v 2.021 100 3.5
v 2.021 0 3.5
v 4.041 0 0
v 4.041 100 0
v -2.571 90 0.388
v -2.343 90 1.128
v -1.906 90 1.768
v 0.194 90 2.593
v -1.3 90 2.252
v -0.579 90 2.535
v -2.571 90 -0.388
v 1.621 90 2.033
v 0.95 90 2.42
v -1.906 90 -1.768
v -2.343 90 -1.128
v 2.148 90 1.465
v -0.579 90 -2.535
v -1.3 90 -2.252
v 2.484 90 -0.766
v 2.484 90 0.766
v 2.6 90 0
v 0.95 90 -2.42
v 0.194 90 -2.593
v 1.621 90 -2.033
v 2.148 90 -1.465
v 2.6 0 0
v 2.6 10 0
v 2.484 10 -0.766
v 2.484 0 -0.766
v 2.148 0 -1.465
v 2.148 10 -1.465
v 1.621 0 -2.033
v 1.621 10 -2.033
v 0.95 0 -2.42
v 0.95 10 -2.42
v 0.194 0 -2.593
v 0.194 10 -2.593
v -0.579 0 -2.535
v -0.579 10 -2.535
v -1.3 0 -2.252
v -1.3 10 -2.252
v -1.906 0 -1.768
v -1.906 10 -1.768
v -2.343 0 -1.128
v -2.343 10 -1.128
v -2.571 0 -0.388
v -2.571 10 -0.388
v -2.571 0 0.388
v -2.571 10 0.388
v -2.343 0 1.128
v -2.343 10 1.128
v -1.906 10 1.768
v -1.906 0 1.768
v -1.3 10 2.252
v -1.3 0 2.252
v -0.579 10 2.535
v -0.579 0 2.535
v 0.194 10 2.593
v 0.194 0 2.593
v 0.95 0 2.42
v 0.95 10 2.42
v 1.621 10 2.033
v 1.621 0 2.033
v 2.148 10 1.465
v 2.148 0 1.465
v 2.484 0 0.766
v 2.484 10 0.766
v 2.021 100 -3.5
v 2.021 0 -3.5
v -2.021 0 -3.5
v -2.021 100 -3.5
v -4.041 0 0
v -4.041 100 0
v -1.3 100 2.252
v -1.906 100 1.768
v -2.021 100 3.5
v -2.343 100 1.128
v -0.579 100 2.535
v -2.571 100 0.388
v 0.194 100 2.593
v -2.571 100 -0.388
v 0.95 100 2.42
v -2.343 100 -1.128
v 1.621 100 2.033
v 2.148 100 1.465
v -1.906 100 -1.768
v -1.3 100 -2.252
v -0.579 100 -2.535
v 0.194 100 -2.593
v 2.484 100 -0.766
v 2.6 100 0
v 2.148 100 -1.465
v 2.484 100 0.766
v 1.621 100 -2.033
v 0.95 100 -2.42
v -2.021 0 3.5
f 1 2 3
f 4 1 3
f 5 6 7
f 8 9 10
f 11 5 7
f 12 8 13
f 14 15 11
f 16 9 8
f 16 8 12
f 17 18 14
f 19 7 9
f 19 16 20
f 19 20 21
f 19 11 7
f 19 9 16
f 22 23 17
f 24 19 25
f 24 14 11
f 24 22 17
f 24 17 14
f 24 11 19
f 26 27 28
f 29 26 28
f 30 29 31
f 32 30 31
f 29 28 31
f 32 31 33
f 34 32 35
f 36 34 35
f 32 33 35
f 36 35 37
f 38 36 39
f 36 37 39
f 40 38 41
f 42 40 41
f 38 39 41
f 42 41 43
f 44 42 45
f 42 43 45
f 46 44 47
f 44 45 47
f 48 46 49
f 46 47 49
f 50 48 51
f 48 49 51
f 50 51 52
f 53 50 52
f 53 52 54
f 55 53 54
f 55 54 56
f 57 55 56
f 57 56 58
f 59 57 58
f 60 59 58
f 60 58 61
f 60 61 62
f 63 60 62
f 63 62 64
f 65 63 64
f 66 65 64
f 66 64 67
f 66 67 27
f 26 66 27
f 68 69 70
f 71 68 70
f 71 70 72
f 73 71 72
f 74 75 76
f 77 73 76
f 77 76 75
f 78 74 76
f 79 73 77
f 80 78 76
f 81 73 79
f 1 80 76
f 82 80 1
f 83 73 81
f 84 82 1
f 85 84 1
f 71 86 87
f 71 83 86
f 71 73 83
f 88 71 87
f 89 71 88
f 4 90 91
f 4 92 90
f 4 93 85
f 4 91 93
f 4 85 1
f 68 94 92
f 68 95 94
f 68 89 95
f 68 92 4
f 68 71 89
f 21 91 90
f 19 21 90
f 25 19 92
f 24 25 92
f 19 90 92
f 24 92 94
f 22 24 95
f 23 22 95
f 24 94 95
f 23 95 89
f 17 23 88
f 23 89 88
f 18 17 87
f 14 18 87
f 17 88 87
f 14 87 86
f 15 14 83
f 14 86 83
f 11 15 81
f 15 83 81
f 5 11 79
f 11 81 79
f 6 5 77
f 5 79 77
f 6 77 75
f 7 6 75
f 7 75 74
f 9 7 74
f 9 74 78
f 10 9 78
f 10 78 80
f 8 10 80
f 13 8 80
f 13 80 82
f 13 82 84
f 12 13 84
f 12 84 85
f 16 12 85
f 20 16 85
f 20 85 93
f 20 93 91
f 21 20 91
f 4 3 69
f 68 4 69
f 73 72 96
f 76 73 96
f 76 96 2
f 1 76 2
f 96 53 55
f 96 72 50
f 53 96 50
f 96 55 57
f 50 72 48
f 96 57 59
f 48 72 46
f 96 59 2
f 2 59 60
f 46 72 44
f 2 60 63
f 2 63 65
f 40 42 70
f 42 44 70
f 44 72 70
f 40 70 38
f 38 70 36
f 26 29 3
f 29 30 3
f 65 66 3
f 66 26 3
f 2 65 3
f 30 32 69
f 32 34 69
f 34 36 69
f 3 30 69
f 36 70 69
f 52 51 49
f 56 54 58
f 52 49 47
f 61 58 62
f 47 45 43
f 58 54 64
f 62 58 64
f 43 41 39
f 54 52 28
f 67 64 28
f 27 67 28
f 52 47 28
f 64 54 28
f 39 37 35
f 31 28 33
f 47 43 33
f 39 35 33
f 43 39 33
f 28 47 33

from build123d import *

# Parameters (mm, degrees)
EXTRUDE_1_DEPTH     = 100
SKETCH_2_R          = 2.6
CUT_EXTRUDE_1_DEPTH = 101
SKETCH_3_R          = 2.6
EXTRUDE_2_DEPTH     = 80


with BuildPart() as part:
    # 草图1 → 凸台-拉伸1 (new body)
    with BuildSketch(Plane(origin=(0, 0, 0), x_dir=(1, 0, 0), z_dir=(0, 1, 0))):
        Polygon((4.041451884, 0), (2.020725942, 3.5), (-2.020725942, 3.5), (-4.041451884, 0), (-2.020725942, -3.5), (2.020725942, -3.5), align=None)
    extrude(amount=EXTRUDE_1_DEPTH)

    # 草图2 → 切除-拉伸1 (cut, through all)
    with BuildSketch(Plane(origin=(0, 100, 0), x_dir=(1, 0, 0), z_dir=(0, 1, 0))):
        Circle(SKETCH_2_R)
    extrude(amount=-CUT_EXTRUDE_1_DEPTH, mode=Mode.SUBTRACT)

    # 草图3 → 凸台-拉伸2 (add)
    with BuildSketch(Plane(origin=(0, 90, 0), x_dir=(1, 0, 0), z_dir=(0, 1, 0))):
        Circle(SKETCH_3_R)
    extrude(amount=-EXTRUDE_2_DEPTH)


solid = part.part
